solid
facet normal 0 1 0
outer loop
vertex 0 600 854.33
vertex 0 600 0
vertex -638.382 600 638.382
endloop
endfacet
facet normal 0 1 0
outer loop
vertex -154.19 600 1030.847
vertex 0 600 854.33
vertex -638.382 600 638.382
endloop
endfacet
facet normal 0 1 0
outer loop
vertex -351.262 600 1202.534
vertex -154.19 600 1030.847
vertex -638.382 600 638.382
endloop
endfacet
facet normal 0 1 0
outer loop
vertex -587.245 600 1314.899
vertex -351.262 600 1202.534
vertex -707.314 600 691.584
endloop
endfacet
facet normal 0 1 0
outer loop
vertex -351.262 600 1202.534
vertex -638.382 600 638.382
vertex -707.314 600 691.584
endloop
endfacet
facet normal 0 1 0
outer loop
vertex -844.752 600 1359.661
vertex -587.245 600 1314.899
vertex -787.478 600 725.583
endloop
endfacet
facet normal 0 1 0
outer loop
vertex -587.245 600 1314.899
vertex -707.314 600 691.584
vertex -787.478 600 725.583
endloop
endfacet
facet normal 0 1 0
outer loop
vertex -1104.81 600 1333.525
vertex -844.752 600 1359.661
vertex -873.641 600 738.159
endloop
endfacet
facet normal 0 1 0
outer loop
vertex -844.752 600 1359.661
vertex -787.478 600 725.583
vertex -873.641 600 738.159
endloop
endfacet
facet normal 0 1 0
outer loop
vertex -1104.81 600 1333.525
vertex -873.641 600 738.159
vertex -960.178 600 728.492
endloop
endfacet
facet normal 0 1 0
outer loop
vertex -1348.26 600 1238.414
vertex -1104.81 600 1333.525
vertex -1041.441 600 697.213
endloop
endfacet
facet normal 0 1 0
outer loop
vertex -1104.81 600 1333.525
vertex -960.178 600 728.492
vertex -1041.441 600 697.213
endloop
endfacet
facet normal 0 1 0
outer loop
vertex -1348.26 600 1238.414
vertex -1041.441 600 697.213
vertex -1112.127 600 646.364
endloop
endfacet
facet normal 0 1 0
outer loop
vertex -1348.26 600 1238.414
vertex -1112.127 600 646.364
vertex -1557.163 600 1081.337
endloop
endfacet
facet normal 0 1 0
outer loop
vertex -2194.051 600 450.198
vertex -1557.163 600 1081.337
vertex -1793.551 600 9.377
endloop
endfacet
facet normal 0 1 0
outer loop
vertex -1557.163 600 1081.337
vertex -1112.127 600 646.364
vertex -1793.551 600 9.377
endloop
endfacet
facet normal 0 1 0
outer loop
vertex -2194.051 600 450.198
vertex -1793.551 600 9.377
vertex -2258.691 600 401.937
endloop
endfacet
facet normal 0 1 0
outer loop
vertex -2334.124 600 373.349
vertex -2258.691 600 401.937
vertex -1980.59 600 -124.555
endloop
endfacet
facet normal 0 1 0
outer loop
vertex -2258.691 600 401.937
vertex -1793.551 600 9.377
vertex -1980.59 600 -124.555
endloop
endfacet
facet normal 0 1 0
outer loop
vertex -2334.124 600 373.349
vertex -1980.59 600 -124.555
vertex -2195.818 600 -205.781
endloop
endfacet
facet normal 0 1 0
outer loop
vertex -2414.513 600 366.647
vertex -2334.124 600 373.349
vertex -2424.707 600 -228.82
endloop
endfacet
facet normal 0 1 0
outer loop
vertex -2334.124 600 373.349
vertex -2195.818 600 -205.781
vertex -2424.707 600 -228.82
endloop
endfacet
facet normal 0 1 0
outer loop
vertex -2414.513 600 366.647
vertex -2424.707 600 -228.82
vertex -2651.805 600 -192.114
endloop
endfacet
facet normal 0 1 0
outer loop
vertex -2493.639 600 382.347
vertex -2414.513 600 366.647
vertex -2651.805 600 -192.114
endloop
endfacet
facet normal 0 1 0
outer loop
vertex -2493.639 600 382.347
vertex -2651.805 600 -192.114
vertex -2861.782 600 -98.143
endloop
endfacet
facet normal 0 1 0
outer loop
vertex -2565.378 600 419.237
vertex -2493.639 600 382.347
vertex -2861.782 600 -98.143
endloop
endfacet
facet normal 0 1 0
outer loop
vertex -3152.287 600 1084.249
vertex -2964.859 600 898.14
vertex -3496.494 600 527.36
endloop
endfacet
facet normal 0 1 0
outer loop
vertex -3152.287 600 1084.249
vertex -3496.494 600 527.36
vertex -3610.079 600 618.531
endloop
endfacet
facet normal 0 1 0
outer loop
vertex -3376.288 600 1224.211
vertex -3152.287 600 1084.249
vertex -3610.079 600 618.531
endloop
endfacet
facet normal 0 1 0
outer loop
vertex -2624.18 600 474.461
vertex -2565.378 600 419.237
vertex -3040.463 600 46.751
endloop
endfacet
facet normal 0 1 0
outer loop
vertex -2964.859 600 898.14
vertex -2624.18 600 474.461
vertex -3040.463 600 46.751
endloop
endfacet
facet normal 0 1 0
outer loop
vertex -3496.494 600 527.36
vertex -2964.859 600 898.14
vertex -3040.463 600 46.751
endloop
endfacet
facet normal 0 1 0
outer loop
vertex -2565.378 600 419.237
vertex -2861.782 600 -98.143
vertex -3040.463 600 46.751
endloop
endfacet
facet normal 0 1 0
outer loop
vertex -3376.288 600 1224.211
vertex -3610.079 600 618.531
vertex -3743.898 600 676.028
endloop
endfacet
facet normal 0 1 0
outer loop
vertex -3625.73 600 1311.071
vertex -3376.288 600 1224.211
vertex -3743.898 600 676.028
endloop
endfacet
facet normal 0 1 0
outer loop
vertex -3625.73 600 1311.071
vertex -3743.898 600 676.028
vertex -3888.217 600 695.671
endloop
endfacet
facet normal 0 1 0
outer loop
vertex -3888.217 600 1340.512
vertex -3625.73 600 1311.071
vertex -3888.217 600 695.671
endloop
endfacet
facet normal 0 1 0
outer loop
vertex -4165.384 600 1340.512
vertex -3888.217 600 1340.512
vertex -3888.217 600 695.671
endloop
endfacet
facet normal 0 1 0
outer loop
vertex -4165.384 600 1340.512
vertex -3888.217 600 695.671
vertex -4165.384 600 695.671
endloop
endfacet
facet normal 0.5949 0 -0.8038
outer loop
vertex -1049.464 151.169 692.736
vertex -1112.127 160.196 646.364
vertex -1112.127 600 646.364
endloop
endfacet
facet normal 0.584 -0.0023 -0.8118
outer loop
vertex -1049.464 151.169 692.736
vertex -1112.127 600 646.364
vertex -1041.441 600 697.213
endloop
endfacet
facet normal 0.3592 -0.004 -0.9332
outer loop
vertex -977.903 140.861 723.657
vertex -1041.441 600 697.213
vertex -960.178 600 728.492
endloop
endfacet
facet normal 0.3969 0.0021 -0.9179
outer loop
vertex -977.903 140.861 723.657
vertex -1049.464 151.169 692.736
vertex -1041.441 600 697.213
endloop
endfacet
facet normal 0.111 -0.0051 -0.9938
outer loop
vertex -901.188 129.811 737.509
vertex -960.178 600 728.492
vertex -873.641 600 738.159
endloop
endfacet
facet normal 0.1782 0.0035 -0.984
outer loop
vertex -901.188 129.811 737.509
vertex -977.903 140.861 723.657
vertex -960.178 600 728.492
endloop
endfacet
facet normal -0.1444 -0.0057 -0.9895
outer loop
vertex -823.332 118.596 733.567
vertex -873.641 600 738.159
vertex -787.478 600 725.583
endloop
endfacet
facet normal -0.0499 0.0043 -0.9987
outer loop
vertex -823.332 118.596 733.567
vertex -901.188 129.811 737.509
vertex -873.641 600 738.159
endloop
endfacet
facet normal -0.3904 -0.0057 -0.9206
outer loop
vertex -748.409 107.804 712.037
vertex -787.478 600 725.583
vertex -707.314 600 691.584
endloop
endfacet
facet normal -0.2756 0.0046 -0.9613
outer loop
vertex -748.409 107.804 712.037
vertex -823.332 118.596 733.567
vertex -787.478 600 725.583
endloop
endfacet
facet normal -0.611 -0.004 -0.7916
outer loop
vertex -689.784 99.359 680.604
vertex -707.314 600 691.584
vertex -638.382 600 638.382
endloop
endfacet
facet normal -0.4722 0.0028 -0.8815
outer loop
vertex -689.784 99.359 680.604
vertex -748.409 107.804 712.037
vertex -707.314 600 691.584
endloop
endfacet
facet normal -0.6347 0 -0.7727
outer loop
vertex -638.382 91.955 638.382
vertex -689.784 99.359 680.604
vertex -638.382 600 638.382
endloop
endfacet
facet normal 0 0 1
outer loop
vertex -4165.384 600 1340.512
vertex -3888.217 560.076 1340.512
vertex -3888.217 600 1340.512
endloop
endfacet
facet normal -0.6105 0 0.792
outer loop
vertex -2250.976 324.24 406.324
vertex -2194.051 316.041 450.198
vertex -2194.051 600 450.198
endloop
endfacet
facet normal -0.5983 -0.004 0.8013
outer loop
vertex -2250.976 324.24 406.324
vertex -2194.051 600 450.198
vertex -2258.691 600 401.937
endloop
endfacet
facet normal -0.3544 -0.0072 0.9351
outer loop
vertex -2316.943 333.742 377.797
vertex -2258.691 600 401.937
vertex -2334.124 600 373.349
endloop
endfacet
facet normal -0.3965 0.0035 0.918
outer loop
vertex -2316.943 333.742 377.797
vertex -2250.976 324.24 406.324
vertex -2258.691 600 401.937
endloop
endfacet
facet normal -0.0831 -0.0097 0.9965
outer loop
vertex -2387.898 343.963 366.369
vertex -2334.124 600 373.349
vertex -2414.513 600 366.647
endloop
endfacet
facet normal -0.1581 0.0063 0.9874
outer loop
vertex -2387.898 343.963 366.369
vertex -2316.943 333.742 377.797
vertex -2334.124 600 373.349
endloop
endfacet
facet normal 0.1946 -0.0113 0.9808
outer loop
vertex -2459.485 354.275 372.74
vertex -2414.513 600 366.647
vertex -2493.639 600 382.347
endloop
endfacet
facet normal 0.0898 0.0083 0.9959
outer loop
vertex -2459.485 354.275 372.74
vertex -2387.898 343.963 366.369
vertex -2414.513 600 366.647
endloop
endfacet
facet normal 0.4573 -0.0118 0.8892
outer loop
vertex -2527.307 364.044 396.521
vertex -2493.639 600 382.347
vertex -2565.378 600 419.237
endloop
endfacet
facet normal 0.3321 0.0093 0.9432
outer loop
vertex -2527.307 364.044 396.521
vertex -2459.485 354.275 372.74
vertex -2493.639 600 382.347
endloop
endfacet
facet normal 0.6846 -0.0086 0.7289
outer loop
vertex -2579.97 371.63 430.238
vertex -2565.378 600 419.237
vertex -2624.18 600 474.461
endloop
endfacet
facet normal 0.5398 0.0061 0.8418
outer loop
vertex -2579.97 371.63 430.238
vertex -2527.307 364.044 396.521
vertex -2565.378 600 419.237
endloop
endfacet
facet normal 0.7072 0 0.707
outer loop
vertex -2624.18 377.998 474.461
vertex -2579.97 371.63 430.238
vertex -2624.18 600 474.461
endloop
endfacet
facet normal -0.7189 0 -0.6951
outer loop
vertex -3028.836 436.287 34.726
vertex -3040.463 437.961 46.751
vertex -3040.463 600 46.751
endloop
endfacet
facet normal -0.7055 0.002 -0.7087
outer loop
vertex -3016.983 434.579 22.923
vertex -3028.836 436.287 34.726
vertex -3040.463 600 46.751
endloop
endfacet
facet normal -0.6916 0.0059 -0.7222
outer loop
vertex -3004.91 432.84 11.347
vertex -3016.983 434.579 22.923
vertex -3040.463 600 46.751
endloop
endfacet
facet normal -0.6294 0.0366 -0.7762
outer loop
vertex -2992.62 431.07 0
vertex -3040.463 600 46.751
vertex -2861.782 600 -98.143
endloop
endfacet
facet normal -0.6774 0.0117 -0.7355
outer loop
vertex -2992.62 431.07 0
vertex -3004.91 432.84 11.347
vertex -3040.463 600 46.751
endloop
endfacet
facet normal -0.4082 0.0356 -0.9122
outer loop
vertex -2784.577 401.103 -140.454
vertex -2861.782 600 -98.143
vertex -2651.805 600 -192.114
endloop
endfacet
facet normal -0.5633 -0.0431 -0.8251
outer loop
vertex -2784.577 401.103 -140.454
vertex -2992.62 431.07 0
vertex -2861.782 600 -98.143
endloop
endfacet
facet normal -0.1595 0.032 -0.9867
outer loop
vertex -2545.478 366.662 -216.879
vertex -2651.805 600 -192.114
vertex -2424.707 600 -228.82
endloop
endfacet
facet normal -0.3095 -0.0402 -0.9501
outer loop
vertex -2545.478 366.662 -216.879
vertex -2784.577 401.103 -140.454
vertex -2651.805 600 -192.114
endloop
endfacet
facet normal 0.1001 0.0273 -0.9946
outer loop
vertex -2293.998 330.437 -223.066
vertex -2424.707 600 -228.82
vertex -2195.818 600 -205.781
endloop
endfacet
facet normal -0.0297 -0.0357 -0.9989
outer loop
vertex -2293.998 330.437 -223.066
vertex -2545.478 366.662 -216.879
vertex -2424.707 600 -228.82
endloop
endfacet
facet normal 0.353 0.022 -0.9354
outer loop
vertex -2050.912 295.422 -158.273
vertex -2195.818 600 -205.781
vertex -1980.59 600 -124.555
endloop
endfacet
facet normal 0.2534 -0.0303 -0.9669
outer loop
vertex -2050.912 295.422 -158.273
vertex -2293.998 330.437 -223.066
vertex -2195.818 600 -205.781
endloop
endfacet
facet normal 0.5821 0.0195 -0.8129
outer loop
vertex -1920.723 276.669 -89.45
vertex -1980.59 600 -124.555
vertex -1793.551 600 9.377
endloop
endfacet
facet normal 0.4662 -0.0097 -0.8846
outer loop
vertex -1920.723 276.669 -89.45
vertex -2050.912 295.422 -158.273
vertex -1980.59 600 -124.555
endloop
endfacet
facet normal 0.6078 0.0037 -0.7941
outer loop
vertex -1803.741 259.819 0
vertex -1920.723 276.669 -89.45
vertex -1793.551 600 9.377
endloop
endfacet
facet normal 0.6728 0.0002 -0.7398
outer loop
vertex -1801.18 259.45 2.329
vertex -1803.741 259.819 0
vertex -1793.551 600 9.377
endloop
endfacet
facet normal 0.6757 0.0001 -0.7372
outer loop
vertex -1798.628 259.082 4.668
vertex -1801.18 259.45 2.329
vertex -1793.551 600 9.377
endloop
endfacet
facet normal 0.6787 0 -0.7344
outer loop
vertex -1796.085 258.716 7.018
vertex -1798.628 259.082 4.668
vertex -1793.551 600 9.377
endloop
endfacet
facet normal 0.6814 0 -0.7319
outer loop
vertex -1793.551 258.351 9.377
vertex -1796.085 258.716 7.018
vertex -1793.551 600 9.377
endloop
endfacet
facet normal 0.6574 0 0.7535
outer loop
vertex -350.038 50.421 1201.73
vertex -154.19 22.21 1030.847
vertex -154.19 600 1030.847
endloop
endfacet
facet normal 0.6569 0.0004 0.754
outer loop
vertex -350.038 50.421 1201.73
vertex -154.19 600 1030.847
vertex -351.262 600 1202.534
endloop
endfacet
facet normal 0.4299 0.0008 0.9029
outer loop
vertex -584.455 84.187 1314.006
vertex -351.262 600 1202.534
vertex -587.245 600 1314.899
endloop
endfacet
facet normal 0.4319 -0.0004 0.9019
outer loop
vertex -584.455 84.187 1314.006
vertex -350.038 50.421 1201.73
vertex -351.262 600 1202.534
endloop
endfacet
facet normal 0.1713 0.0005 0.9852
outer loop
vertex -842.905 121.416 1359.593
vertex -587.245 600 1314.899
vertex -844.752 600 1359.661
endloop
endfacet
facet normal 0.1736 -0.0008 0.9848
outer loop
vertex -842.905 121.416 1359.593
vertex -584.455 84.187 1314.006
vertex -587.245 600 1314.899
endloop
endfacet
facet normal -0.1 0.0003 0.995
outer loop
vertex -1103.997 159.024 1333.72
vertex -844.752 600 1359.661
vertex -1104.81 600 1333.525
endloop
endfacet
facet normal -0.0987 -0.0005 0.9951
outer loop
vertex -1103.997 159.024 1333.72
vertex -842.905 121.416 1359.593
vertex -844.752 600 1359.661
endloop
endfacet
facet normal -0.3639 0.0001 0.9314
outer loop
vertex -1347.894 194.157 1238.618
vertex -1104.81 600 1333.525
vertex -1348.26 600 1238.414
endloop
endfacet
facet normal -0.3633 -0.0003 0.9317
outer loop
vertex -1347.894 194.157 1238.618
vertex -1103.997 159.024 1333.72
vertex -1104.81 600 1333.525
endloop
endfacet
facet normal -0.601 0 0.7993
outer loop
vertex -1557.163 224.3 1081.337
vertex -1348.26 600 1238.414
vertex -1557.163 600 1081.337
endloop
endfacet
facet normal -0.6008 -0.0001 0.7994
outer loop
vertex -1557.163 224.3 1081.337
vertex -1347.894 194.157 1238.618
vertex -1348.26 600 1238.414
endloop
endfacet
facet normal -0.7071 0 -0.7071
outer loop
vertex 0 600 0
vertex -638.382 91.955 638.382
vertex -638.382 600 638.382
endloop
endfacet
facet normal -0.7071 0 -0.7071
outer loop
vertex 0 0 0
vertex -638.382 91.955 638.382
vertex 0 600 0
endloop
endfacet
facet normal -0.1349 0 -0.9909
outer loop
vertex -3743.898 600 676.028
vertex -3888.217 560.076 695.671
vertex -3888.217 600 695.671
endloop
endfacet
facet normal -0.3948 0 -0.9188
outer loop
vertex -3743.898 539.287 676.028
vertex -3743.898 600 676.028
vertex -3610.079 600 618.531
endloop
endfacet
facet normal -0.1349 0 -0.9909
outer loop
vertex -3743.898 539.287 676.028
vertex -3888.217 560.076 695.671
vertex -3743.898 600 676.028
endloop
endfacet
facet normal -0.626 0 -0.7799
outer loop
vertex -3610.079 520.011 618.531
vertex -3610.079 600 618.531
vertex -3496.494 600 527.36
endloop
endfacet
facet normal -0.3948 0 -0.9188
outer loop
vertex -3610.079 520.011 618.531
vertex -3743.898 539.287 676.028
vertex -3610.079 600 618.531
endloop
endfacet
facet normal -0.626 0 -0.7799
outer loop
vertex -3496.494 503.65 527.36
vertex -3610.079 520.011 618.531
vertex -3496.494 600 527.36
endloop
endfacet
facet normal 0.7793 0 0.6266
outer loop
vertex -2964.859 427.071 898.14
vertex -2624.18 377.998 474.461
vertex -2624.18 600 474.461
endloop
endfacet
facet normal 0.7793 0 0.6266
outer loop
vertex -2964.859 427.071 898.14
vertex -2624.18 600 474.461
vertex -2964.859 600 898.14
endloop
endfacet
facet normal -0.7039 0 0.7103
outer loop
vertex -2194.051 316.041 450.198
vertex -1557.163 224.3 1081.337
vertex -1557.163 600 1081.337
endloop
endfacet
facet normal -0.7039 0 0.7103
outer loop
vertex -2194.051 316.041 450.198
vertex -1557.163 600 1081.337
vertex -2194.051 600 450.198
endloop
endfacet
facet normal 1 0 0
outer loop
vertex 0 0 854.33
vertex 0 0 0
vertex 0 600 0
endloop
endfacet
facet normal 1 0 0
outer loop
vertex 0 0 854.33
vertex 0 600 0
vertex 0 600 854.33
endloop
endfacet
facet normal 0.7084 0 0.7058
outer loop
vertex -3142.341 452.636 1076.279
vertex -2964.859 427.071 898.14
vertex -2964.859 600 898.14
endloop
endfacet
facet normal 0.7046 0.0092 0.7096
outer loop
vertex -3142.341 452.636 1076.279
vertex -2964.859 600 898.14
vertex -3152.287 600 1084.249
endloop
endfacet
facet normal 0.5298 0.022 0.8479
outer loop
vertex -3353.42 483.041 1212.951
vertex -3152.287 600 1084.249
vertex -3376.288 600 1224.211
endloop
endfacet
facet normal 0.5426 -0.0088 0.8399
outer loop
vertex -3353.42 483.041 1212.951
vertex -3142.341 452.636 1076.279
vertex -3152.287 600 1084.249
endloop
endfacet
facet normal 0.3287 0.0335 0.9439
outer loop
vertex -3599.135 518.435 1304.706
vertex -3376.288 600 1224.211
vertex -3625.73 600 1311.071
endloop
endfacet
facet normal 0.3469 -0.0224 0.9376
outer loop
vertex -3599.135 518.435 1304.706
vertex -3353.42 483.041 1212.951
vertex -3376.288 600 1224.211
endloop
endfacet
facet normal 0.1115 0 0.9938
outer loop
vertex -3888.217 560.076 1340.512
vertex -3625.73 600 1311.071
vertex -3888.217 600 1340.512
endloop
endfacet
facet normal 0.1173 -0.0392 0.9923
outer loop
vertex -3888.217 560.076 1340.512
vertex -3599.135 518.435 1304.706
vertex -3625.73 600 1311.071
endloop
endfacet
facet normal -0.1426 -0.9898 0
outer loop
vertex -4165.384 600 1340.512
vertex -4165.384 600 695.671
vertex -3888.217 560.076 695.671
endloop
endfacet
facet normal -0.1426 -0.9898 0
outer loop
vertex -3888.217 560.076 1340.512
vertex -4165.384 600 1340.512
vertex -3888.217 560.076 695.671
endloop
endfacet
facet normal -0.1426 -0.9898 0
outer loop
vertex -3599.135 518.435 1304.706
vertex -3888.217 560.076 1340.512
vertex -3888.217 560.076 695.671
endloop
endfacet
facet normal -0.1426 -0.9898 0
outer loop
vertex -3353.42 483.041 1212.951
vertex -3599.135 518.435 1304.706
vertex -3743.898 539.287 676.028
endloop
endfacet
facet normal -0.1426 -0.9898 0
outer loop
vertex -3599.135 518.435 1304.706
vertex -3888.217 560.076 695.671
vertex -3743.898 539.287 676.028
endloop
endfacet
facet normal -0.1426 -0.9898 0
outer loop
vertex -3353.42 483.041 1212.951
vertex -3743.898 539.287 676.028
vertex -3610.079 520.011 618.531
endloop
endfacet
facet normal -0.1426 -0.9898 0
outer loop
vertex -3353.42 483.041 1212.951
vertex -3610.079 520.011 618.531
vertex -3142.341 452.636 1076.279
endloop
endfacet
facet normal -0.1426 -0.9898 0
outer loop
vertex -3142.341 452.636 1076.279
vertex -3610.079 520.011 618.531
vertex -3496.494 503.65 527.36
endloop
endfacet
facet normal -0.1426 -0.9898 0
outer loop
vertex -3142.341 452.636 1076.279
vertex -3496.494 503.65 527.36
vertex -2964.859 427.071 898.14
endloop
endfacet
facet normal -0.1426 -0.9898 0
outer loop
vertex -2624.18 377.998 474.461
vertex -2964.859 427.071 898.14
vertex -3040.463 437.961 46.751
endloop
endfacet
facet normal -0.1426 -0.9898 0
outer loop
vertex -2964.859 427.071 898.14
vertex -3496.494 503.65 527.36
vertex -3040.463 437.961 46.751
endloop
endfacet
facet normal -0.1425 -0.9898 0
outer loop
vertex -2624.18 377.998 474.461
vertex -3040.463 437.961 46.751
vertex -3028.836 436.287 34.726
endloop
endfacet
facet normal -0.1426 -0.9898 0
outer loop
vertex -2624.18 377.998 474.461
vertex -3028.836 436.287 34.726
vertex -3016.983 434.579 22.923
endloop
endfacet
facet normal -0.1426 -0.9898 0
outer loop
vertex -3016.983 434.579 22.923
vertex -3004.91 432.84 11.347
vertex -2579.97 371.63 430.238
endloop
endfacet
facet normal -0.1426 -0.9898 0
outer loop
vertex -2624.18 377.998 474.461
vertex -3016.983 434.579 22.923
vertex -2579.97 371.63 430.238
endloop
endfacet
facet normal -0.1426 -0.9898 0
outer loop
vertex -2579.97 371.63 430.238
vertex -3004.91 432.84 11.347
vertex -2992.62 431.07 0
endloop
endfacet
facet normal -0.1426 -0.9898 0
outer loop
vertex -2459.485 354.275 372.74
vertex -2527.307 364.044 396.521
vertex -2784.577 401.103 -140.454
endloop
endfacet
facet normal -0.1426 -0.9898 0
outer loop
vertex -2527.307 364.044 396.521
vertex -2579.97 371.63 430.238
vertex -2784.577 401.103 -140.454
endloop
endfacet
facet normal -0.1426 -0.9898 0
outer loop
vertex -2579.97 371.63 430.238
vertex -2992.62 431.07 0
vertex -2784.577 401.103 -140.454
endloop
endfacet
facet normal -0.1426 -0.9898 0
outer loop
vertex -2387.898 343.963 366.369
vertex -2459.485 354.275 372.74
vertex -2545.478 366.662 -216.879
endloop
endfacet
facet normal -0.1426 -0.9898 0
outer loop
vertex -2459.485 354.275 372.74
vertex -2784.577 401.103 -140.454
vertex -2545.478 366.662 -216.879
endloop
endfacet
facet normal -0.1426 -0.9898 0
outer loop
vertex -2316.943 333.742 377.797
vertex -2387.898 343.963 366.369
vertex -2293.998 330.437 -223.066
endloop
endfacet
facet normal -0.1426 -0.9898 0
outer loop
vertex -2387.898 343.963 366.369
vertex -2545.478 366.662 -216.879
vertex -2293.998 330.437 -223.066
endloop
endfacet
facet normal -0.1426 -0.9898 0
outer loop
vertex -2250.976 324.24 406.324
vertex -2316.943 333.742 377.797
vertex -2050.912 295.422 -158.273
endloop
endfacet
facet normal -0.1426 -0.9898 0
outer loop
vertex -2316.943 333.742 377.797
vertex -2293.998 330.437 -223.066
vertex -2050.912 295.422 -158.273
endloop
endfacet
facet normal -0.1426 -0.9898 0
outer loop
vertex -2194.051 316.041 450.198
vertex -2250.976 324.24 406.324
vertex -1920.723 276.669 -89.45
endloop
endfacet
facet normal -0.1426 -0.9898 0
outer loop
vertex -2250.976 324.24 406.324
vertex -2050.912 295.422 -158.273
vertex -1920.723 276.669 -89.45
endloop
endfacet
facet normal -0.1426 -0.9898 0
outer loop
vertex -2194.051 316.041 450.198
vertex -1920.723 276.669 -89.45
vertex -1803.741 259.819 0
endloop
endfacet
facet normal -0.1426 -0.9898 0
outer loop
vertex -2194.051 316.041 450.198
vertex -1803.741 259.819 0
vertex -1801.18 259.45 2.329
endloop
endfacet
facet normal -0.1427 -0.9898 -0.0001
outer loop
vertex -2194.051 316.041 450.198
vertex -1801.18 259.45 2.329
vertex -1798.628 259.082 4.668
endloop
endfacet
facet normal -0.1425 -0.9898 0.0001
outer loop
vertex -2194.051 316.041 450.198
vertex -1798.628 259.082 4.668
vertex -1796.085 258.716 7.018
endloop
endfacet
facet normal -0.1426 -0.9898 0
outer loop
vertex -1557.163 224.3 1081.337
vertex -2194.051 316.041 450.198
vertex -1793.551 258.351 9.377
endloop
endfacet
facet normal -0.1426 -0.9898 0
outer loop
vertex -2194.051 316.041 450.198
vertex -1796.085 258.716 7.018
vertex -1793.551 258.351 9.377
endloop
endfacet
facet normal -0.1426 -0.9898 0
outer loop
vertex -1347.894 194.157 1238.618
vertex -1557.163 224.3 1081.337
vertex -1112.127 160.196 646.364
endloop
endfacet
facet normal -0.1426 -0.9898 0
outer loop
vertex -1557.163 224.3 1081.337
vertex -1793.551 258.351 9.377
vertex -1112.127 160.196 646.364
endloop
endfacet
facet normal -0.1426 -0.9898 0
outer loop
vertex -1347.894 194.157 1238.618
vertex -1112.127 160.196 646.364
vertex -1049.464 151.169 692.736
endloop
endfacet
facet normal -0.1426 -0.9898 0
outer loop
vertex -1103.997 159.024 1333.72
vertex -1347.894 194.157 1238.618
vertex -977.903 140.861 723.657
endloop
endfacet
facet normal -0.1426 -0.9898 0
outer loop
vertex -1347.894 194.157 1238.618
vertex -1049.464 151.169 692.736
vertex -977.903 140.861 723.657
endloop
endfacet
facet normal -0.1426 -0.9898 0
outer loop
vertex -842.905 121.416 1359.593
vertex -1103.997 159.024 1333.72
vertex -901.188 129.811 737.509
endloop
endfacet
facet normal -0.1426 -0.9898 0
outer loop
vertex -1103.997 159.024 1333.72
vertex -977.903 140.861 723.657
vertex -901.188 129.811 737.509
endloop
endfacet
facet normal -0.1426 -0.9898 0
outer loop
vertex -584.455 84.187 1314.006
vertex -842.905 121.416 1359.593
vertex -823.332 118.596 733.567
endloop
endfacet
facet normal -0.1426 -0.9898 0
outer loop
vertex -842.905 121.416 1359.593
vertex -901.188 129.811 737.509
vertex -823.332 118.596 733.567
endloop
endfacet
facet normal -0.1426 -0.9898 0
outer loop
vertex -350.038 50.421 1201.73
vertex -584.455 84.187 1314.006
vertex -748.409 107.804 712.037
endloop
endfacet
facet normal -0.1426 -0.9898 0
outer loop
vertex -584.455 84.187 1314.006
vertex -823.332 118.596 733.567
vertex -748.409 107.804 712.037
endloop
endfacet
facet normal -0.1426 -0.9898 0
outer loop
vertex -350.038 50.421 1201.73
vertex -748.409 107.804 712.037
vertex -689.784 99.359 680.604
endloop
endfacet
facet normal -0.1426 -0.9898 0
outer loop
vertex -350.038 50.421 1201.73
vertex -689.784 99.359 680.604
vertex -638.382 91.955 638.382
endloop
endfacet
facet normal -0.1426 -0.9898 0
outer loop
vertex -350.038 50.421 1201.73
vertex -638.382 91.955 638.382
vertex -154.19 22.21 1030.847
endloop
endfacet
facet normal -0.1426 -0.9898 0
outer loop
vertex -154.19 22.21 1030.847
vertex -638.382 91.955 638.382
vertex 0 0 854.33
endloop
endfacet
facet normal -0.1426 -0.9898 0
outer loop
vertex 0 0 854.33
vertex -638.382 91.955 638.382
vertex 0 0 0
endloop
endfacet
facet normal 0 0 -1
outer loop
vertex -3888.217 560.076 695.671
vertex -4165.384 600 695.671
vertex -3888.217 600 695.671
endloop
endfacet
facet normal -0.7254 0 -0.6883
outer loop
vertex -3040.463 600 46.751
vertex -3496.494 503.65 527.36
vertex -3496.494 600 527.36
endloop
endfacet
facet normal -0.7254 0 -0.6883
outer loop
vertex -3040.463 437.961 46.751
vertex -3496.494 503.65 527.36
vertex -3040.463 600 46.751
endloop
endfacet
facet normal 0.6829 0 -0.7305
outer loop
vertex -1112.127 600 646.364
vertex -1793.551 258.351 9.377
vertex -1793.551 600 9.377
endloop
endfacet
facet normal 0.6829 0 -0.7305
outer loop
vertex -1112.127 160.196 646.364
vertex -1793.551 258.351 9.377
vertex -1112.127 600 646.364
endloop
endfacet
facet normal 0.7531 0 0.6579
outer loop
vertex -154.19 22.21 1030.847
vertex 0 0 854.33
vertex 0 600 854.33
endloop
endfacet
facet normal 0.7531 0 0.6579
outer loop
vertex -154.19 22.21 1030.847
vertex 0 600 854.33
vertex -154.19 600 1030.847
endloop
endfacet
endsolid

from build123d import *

# Parameters (mm, degrees)
BOSS_EXTRUDE3_DEPTH     = 600
CUT_EXTRUDE1_DEPTH      = 2000
CUT_EXTRUDE1_DEPTH_BACK = 2000


with BuildPart() as part:
    # Sketch1 → Boss-Extrude3 (new body)
    with BuildSketch(Plane(origin=(0, 0, 0), x_dir=(1, 0, 0), z_dir=(0, 1, 0))):
        with BuildLine():
            Line((0, 0), (0, -854.33))
            Line((0, -854.33), (-154.190463005, -1030.847317622))
            ThreePointArc((-154.190463005, -1030.847317622), (-844.751743063, -1359.661426587), (-1557.162523479, -1081.337012069))
            Line((-1557.162523479, -1081.337012069), (-2194.051488263, -450.19764079))
            ThreePointArc((-2194.051488263, -450.19764079), (-2414.513161537, -366.64657948), (-2624.180140047, -474.460712836))
            Line((-2624.180140047, -474.460712836), (-2964.859106314, -898.139677134))
            ThreePointArc((-2964.859106314, -898.139677134), (-3376.288360318, -1224.211199414), (-3888.216806642, -1340.512250728))
            Line((-3888.216806642, -1340.512250728), (-4165.384496326, -1340.512250728))
            Line((-4165.384496326, -1340.512250728), (-4165.384496326, -695.670559359))
            Line((-4165.384496326, -695.670559359), (-3888.216806642, -695.670559359))
            ThreePointArc((-3888.216806642, -695.670559359), (-3675.041307945, -651.811876682), (-3496.493944625, -527.360214008))
            Line((-3496.493944625, -527.360214008), (-3040.463363472, -46.750645832))
            ThreePointArc((-3040.463363472, -46.750645832), (-2424.707007304, 228.819562259), (-1793.551427485, -9.376709356))
            Line((-1793.551427485, -9.376709356), (-1112.126726764, -646.363592415))
            ThreePointArc((-1112.126726764, -646.363592415), (-873.640525372, -738.159045255), (-638.381938968, -638.381938968))
            Line((-638.381938968, -638.381938968), (0, 0))
        make_face()
    extrude(amount=BOSS_EXTRUDE3_DEPTH)

    # Sketch2 → Cut-Extrude1 (cut, two sides)
    with BuildSketch(Plane.XY) as cut_extrude1_sk:
        Polygon((-4165.384496326, 600), (0, 0), (-4165.384496326, 0), align=None)
    extrude(amount=CUT_EXTRUDE1_DEPTH, mode=Mode.SUBTRACT)
    extrude(cut_extrude1_sk.sketch, amount=-CUT_EXTRUDE1_DEPTH_BACK, mode=Mode.SUBTRACT)


solid = part.part
